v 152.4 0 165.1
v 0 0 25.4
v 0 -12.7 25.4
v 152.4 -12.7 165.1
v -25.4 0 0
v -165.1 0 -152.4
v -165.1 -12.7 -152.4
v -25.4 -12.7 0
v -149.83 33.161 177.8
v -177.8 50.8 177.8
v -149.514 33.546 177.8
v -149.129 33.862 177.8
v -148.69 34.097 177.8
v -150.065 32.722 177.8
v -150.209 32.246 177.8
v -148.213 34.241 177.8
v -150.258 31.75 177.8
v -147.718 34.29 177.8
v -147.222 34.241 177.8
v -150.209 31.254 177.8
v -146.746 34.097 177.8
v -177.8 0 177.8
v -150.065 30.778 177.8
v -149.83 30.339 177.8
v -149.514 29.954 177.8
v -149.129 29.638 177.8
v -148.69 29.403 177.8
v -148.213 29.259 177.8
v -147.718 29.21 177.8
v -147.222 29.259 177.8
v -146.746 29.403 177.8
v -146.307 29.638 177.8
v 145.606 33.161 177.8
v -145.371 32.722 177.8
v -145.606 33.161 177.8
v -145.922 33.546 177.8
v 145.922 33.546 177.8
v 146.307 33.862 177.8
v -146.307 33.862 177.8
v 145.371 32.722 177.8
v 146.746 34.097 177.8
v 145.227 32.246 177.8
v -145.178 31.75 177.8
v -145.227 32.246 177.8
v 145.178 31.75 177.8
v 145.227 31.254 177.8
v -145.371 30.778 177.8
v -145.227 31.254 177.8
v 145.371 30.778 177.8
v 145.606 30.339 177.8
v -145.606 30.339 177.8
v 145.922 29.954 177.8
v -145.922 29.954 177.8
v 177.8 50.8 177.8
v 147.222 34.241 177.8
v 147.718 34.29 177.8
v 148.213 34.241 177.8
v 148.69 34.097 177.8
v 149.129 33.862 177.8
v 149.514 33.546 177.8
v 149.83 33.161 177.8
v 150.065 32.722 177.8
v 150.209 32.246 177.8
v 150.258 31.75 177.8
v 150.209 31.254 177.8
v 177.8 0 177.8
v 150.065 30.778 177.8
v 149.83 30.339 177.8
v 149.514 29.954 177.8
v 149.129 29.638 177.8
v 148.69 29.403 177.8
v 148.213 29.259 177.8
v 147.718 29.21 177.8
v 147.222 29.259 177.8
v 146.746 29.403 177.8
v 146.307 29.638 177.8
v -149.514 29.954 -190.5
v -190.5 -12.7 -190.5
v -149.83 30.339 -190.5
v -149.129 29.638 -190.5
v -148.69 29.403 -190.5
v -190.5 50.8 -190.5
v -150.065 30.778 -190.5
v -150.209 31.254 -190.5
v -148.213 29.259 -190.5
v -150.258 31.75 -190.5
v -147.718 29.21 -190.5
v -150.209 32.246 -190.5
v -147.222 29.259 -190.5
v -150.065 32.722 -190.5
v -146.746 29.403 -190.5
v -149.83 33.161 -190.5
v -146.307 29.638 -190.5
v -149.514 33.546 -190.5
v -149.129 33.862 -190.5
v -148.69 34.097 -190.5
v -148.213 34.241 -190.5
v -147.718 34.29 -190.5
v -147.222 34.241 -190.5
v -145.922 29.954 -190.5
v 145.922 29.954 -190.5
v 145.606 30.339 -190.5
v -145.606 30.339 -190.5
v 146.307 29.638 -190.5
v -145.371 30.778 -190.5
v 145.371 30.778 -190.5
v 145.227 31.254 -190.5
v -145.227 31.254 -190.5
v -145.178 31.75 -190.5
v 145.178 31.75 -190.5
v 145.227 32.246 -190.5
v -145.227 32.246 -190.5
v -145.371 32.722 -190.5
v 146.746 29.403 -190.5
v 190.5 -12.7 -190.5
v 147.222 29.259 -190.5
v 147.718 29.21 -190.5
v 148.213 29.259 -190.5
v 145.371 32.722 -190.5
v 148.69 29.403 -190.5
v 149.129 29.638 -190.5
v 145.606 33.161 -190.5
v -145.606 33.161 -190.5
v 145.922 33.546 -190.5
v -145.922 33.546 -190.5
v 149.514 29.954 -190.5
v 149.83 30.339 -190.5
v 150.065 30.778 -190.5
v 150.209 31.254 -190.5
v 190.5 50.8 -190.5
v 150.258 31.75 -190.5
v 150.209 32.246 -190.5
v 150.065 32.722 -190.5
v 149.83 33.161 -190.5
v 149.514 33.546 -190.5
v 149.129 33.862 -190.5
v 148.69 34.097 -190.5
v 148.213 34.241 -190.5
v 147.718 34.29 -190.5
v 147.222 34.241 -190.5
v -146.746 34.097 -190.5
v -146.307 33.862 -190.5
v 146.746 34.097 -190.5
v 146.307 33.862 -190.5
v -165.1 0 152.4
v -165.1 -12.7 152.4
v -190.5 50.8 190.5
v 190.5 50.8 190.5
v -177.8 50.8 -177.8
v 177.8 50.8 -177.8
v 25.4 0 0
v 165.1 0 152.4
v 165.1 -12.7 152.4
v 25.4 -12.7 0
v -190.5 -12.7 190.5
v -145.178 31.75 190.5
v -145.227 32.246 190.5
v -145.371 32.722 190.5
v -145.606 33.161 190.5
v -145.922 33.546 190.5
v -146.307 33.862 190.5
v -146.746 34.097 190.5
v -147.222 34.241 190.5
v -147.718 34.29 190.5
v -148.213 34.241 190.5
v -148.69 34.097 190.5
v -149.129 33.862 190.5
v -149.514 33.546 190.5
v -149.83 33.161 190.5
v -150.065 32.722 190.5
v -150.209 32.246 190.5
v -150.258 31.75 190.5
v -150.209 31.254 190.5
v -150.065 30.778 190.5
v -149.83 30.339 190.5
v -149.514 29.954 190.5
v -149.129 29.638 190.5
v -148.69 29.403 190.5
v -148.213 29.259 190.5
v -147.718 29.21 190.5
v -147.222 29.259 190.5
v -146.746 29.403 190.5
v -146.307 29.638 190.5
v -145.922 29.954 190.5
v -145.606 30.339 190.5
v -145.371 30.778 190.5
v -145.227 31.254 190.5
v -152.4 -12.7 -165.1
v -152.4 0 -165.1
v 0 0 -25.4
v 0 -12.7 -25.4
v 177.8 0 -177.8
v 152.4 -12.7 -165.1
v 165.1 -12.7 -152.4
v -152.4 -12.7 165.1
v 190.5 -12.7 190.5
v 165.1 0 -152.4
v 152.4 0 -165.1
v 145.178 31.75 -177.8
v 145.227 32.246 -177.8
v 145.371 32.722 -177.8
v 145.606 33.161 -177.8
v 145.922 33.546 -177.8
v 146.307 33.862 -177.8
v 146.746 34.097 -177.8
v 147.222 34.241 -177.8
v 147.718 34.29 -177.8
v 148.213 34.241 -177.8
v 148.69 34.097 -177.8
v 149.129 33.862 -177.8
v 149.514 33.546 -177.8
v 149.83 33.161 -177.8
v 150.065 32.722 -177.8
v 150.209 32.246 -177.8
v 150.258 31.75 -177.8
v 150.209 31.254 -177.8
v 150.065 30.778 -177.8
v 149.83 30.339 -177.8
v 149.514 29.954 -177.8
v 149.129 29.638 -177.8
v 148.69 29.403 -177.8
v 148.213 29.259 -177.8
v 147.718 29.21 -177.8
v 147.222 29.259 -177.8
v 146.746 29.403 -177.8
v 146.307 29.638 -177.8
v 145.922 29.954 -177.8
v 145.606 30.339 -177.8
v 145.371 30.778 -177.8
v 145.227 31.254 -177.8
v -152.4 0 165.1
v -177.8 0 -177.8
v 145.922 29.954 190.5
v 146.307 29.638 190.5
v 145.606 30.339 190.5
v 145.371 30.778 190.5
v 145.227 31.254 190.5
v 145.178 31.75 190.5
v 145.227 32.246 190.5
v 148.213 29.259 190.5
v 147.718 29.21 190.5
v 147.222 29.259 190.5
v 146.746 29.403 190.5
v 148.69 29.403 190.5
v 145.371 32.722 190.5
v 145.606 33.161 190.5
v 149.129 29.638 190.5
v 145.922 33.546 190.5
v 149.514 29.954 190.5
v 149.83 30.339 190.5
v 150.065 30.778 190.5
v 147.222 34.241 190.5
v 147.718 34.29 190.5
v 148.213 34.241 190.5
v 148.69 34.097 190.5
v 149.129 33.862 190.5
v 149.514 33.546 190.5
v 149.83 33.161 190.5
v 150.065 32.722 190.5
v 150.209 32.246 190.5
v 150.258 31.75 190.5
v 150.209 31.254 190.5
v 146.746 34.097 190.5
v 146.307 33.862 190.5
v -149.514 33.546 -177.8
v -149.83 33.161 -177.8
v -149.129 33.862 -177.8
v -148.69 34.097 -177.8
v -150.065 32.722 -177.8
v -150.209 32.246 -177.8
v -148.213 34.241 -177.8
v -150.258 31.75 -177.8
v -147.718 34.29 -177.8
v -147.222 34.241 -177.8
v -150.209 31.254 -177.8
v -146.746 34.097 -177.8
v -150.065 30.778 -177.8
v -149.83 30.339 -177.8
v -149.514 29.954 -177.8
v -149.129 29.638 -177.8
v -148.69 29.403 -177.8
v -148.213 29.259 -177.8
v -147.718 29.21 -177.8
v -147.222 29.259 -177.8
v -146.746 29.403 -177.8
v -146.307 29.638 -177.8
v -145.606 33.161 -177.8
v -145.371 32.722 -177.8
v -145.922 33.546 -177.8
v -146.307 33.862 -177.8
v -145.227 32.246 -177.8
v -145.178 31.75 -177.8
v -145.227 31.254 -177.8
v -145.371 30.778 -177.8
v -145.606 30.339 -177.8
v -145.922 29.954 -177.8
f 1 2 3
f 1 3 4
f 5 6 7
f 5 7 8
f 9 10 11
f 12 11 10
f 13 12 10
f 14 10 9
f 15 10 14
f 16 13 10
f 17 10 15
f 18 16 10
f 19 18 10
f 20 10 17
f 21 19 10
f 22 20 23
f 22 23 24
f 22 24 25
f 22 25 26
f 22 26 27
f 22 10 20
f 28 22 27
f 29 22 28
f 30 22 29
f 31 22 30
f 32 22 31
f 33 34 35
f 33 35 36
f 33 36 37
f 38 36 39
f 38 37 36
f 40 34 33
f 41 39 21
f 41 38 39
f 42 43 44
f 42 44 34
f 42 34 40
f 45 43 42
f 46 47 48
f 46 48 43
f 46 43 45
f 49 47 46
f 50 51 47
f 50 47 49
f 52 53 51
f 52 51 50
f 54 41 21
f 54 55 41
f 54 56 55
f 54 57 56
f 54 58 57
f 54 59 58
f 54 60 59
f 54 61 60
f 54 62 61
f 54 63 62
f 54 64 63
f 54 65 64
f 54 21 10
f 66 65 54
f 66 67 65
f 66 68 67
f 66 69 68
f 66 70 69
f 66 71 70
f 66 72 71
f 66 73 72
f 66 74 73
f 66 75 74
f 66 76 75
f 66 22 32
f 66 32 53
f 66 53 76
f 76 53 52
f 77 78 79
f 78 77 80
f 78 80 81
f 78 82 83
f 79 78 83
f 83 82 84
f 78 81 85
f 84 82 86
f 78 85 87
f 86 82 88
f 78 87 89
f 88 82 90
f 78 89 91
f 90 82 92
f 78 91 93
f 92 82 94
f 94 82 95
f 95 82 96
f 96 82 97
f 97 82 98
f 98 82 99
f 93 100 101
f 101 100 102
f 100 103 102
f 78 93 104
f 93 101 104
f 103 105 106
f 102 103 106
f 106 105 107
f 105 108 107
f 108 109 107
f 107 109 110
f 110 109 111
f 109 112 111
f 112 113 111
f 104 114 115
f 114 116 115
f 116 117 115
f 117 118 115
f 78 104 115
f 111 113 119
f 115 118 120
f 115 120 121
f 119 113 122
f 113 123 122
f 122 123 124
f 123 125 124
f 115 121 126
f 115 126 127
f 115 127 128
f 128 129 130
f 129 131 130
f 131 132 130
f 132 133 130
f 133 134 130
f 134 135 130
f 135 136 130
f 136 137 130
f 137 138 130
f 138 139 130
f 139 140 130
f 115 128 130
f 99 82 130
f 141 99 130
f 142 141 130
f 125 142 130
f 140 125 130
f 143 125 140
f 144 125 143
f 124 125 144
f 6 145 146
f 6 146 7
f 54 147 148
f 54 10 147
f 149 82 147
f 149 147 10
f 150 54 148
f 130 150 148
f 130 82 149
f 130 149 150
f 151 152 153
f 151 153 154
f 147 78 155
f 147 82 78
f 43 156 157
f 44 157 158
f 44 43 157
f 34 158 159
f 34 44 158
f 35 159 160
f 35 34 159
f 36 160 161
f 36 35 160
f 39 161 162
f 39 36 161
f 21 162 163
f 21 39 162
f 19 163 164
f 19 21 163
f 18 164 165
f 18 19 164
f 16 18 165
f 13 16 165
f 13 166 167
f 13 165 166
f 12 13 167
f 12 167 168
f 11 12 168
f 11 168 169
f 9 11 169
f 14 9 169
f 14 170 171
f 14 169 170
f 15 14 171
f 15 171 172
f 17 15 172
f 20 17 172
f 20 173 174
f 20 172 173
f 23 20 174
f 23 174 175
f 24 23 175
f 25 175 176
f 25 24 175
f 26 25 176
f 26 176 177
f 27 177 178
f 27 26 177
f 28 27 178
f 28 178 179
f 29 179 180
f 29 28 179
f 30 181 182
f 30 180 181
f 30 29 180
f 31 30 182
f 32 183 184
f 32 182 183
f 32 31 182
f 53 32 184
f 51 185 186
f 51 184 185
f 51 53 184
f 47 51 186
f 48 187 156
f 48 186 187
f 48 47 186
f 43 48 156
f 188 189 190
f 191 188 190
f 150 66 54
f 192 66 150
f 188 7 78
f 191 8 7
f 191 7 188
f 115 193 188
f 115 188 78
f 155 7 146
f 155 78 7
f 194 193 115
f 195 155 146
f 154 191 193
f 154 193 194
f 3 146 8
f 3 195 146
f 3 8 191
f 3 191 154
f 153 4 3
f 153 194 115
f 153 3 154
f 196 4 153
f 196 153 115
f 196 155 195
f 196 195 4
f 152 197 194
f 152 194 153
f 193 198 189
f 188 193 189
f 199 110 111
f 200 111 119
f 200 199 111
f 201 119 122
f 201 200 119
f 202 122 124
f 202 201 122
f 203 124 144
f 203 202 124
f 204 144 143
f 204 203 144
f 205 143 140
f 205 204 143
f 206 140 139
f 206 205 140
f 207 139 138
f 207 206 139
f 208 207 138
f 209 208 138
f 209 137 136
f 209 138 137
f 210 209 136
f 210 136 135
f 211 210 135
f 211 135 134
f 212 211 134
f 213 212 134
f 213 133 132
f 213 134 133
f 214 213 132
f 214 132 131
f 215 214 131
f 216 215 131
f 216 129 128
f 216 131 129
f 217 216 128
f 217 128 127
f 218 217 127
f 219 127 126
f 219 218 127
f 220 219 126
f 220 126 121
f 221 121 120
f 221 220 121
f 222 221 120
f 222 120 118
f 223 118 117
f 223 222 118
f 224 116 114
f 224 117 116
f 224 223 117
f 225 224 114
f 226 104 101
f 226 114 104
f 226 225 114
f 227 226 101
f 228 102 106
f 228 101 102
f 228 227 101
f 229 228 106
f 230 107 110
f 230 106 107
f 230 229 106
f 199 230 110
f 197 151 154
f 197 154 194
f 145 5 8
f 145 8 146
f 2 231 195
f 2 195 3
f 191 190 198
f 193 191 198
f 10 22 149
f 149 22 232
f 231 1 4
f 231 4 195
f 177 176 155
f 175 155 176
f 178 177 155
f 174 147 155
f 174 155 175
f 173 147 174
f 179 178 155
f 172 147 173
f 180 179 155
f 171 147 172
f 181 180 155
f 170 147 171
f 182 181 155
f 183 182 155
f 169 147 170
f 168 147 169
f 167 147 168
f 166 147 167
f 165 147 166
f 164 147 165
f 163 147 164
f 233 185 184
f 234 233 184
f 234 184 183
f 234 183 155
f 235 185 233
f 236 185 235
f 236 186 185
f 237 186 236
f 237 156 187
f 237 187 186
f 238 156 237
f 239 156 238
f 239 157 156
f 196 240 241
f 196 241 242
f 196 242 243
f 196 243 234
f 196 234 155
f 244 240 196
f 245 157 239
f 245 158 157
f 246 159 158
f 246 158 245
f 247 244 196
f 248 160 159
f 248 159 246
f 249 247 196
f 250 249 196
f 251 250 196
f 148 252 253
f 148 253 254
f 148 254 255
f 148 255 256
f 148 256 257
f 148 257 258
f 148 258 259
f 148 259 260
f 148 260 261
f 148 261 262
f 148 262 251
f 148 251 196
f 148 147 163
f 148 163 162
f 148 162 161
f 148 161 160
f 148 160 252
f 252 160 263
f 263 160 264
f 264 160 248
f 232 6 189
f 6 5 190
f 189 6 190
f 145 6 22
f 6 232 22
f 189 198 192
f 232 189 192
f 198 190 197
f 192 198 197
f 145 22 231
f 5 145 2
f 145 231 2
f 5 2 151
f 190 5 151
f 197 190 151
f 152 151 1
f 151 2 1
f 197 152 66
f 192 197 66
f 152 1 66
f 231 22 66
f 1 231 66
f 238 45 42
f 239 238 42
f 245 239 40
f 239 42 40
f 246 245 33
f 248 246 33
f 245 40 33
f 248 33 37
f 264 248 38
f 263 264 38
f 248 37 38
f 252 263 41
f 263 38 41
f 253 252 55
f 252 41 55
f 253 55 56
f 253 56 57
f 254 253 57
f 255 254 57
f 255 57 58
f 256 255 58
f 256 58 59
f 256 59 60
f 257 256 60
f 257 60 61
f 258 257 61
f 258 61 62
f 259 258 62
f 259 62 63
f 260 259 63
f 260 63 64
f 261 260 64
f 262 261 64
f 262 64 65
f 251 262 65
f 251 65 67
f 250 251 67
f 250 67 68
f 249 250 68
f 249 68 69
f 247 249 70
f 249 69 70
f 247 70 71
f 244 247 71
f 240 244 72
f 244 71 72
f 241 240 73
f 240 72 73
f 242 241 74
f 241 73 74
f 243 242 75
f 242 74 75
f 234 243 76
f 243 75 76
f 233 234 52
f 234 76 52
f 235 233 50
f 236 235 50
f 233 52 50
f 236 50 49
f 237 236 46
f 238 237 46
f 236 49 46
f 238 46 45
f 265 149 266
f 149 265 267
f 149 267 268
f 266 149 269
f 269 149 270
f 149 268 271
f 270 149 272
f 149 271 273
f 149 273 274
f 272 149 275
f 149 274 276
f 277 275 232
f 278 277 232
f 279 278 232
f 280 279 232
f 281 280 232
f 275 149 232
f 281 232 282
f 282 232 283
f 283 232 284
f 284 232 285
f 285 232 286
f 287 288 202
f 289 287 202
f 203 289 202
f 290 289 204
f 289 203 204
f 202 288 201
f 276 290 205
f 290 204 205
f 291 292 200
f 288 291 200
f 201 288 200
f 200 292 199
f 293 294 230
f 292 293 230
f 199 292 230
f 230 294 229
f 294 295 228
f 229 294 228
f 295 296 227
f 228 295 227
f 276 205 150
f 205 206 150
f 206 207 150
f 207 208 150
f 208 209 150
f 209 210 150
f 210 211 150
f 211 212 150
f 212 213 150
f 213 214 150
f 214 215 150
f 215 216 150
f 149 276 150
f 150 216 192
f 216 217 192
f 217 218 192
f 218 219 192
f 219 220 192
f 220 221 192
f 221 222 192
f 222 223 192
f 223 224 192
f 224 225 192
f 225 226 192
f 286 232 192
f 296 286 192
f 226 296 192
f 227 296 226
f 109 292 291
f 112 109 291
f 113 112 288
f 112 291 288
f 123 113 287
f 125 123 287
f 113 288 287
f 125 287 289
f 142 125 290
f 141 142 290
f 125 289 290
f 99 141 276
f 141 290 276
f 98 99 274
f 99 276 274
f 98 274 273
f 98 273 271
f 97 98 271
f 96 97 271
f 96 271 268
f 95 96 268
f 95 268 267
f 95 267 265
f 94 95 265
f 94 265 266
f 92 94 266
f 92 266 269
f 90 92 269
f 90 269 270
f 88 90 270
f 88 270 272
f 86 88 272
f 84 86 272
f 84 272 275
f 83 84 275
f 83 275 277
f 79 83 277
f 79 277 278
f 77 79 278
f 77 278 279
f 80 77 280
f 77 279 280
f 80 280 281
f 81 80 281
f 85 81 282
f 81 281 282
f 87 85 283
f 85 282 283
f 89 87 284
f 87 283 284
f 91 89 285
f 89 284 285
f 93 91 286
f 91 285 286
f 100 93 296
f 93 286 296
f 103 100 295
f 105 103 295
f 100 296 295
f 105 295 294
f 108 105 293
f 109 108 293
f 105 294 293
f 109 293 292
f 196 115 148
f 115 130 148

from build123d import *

# Parameters (mm, degrees)
SKETCH1_W                                  = 381
SKETCH1_H                                  = 381
SKETCH1_W_2                                = 355.6
SKETCH1_H_2                                = 355.6
BOSS_EXTRUDE2_DEPTH                        = 50.8
SKETCH2_R                                  = 2.54
CUT_EXTRUDE3_DEPTH                         = 418.750858766
MIRROR1_AT_THE_SECOND_PLANE_COPY_1_SKETC_R = 2.54
MIRROR1_AT_THE_SECOND_PLANE_COPY_1_DEPTH   = 418.750858766
SKETCH3_W                                  = 381
SKETCH3_H                                  = 381
BOSS_EXTRUDE3_DEPTH                        = 12.7
CUT_EXTRUDE4_DEPTH                         = 275.155320941


with BuildPart() as part:
    # Sketch1 → Boss-Extrude2 (new body)
    with BuildSketch(Plane(origin=(0, 0, 0), x_dir=(1, 0, 0), z_dir=(0, 1, 0))):
        Rectangle(SKETCH1_W, SKETCH1_H)
        Rectangle(SKETCH1_W_2, SKETCH1_H_2, mode=Mode.SUBTRACT)
    extrude(amount=BOSS_EXTRUDE2_DEPTH)

    # Sketch2 → Cut-Extrude3 (cut, through all)
    with BuildSketch(Plane.XY.offset(-177.8)):
        with Locations((-147.717881469, 31.75)):
            Circle(SKETCH2_R)
    cut_extrude3 = extrude(amount=-CUT_EXTRUDE3_DEPTH, mode=Mode.SUBTRACT)

    # Mirror1: Cut-Extrude3 across plane
    add(cut_extrude3.mirror(Plane.XY), mode=Mode.SUBTRACT)

    # Mirror1 at the second plane: Cut-Extrude3 across plane
    add(cut_extrude3.mirror(Plane(origin=(0, 0, 0), x_dir=(0, 0, 1), z_dir=(1, 0, 0))), mode=Mode.SUBTRACT)

    # Mirror1 at the second plane copy 1 sketc → Mirror1 at the second plane copy 1 (cut, through all)
    with BuildSketch(Plane(origin=(0, 0, 177.8), x_dir=(-1, 0, 0), z_dir=(0, 0, -1))):
        with Locations((-147.717881469, 31.75)):
            Circle(MIRROR1_AT_THE_SECOND_PLANE_COPY_1_SKETC_R)
    extrude(amount=-MIRROR1_AT_THE_SECOND_PLANE_COPY_1_DEPTH, mode=Mode.SUBTRACT)

    # Sketch3 → Boss-Extrude3 (add)
    with BuildSketch(Plane.XZ):
        Rectangle(SKETCH3_W, SKETCH3_H)
    extrude(amount=BOSS_EXTRUDE3_DEPTH)

    # Sketch4 → Cut-Extrude4 (cut, through all)
    with BuildSketch(Plane(origin=(0, 0, 0), x_dir=(1, 0, 0), z_dir=(0, 1, 0))):
        Polygon((-152.4, 165.1), (0, 25.4), (152.4, 165.1), align=None)
        Polygon((165.1, 152.4), (165.1, -152.4), (25.4, 0), align=None)
        Polygon((152.4, -165.1), (-152.4, -165.1), (0, -25.4), align=None)
        Polygon((-165.1, -152.4), (-165.1, 152.4), (-25.4, 0), align=None)
    extrude(amount=-CUT_EXTRUDE4_DEPTH, mode=Mode.SUBTRACT)


solid = part.part
